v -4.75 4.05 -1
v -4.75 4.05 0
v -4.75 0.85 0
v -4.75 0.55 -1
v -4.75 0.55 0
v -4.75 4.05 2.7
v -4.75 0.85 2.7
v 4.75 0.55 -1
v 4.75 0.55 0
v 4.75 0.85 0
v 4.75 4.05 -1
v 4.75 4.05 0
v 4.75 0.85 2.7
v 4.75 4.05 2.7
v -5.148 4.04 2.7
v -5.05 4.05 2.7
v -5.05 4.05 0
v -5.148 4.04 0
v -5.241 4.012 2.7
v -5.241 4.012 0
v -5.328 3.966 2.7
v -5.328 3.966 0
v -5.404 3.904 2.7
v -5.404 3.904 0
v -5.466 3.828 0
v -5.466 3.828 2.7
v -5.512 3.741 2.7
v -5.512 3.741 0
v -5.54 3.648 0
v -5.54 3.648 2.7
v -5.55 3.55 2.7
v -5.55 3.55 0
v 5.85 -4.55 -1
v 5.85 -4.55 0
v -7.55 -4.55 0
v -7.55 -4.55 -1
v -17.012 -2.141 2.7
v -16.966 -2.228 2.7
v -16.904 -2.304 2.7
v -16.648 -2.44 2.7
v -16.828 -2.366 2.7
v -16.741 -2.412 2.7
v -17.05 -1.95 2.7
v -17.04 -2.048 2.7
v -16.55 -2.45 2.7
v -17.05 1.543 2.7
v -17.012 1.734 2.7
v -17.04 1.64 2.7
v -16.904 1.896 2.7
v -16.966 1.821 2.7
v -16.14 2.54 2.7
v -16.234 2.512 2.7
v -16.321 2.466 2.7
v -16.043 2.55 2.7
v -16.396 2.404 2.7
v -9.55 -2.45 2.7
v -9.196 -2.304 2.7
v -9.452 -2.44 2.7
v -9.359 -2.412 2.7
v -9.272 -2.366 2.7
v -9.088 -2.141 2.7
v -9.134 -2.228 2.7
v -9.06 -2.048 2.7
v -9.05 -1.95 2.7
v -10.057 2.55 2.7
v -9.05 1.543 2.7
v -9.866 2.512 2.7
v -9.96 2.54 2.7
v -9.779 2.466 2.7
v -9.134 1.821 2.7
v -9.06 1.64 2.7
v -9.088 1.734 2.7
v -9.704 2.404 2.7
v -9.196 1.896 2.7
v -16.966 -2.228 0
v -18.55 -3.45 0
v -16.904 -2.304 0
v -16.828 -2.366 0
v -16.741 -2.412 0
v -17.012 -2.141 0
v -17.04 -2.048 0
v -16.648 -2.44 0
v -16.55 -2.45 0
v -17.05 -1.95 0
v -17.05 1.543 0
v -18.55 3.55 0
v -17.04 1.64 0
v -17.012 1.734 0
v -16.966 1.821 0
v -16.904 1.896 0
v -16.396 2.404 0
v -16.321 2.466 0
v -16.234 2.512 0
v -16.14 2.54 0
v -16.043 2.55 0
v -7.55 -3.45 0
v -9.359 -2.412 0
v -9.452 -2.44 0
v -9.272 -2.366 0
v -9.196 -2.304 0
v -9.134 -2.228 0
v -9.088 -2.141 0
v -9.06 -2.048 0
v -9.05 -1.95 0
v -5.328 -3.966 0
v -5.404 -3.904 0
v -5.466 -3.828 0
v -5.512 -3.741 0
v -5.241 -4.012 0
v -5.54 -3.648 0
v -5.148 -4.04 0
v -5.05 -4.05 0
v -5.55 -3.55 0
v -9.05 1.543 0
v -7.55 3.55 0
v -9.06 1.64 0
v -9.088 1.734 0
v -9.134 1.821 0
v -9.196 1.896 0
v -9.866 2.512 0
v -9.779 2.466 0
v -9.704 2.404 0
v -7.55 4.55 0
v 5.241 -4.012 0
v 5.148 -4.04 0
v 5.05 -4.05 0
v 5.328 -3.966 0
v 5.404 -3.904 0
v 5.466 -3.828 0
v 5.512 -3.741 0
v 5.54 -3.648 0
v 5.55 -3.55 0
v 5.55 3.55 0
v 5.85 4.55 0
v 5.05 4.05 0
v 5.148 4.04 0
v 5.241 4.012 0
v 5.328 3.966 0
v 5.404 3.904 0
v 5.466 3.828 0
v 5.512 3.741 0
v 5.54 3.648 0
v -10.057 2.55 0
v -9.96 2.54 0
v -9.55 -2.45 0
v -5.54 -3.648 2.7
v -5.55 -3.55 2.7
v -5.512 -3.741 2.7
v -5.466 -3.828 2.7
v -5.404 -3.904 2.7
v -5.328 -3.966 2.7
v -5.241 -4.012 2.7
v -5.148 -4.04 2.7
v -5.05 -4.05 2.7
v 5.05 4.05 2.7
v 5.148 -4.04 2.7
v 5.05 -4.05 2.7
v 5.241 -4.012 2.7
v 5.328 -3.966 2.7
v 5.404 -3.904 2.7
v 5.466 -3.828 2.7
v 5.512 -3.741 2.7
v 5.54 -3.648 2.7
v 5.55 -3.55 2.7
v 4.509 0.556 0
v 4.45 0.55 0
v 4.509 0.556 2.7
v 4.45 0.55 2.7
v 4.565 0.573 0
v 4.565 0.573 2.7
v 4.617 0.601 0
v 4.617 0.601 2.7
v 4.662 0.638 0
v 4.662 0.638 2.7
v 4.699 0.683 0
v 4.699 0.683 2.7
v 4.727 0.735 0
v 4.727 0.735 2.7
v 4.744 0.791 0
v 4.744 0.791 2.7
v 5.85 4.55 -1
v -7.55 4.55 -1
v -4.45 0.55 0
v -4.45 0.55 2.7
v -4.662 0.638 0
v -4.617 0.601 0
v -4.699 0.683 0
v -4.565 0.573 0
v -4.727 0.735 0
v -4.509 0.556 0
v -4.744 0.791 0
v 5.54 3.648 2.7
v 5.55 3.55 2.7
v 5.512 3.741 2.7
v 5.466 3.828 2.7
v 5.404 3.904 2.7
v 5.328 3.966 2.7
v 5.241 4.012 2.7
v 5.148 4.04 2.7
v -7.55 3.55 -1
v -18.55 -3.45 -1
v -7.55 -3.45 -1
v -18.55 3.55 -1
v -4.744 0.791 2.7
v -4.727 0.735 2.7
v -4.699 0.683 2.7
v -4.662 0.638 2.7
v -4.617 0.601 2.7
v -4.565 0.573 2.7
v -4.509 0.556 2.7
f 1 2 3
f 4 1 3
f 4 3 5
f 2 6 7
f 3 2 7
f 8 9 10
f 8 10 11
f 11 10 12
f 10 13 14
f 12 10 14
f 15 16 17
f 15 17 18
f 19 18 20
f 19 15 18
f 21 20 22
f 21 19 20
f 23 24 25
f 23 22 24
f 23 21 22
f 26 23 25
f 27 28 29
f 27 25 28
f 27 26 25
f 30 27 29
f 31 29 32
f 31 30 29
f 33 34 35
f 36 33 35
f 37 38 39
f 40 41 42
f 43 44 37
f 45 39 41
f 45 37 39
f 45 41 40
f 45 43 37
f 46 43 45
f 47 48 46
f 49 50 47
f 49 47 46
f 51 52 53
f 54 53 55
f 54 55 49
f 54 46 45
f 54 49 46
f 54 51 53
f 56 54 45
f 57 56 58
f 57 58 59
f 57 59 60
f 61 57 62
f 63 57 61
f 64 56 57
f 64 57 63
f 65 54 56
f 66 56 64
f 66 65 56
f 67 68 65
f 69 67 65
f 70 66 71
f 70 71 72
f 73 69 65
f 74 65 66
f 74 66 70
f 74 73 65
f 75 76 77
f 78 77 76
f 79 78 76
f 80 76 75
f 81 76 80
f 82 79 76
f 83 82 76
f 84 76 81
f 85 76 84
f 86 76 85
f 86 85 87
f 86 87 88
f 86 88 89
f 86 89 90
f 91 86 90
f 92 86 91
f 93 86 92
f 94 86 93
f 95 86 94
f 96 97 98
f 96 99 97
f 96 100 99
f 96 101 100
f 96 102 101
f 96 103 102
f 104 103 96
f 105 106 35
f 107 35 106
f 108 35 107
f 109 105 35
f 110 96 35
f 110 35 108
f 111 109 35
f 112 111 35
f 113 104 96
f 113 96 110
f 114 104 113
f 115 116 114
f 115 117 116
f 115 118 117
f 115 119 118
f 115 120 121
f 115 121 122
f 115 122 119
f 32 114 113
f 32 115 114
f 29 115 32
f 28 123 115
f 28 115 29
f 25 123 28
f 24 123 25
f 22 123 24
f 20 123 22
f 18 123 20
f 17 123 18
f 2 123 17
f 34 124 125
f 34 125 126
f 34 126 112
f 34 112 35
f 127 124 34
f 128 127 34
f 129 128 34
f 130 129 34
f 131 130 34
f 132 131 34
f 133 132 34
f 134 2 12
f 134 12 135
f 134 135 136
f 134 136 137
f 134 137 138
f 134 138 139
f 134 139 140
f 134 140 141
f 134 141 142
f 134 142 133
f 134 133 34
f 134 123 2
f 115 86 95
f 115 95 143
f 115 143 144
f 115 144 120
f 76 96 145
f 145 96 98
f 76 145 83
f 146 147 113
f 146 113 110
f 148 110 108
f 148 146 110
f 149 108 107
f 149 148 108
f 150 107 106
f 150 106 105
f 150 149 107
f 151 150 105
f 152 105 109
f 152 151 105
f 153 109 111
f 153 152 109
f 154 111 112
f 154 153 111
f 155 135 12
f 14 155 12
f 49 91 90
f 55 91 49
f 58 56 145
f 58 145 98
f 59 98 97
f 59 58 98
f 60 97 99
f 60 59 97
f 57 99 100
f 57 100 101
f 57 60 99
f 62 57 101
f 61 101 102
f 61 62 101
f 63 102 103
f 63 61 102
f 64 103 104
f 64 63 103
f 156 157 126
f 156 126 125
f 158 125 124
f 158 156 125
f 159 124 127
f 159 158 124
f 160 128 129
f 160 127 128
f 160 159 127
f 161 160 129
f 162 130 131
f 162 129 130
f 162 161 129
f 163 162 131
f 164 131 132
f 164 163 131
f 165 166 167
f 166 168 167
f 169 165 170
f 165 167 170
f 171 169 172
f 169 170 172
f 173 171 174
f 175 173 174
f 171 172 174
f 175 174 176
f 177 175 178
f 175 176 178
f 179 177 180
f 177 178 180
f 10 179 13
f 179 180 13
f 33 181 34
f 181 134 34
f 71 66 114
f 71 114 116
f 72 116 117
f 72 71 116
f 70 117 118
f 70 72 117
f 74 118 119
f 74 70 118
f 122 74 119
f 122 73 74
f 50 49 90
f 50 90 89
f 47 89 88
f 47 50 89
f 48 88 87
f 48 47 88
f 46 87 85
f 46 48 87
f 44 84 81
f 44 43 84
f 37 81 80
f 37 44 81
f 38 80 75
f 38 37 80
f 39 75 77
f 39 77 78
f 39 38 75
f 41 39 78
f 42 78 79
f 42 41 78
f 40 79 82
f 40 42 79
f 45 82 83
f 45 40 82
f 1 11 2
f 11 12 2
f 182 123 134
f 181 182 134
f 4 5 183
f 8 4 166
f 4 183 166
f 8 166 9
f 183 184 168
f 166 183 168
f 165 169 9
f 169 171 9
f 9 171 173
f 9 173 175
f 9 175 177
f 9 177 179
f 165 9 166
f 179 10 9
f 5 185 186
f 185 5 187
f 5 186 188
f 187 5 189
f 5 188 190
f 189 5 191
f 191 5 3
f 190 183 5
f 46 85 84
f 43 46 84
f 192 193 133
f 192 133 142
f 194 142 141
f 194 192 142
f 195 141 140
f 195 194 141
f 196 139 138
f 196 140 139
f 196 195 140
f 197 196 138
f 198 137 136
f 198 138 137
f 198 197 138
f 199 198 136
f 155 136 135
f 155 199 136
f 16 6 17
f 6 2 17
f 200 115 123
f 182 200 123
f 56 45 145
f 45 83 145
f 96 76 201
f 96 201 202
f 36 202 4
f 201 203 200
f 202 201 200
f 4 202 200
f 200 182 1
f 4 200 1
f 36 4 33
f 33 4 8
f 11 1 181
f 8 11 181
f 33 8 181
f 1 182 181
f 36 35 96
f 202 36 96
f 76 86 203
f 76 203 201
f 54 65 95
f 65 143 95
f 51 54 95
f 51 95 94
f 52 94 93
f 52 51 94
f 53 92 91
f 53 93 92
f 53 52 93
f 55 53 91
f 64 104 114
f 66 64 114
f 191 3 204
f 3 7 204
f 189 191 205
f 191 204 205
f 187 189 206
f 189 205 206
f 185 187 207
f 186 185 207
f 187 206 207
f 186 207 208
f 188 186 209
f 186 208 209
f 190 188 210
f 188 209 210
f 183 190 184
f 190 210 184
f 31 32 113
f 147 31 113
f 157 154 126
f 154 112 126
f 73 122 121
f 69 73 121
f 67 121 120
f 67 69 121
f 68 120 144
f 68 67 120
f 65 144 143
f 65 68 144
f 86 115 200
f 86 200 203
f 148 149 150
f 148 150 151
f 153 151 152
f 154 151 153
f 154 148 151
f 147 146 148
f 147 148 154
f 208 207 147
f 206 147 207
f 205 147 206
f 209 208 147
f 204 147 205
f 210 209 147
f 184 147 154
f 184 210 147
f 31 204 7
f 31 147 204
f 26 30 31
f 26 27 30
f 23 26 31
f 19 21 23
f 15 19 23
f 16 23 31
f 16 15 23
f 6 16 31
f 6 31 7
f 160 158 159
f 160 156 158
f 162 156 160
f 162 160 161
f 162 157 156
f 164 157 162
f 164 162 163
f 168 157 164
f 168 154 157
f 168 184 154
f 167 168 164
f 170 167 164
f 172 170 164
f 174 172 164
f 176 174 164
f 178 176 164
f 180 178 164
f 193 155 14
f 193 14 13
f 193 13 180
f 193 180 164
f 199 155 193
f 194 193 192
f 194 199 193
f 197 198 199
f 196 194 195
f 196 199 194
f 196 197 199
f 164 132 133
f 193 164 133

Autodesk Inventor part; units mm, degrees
ref_plane "YZ Plane" through (0, 0, 0) normal (1, 0, 0) x (0, 1, 0)
ref_plane "XZ Plane" through (0, 0, 0) normal (0, 1, 0) x (-1, 0, 0)
ref_plane "XY Plane" through (0, 0, 0) normal (0, 0, 1) x (1, 0, 0)
sketch "Sketch1" plane through (0, 0, 0) normal (0, 0, 1) x (1, 0, 0)
  line L0 (-5.55, -4.05) -> (5.55, -4.05)
  line L1 (5.55, -4.05) -> (5.55, 4.05)
  line L2 (5.55, 4.05) -> (-5.55, 4.05)
  line L3 (-5.55, 4.05) -> (-5.55, -4.05)
  line L4 (-5.55, -4.05) -> (5.55, 4.05) construction
  line L5 (5.55, -4.05) -> (-5.55, 4.05) construction
  line L6 (-4.75, 0.55) -> (4.75, 0.55)
  line L7 (4.75, 0.55) -> (4.75, 7.55)
  line L8 (4.75, 7.55) -> (-4.75, 7.55)
  line L9 (-4.75, 7.55) -> (-4.75, 0.55)
  line L10 (-4.75, 0.55) -> (4.75, 7.55) construction
  line L11 (4.75, 0.55) -> (-4.75, 7.55) construction
  line L12 (5.85, -4.55) -> (-7.55, -4.55)
  line L13 (-7.55, -4.55) -> (-7.55, 4.55)
  line L14 (-7.55, 4.55) -> (5.85, 4.55)
  line L15 (5.85, 4.55) -> (5.85, -4.55)
  line L16 (-17.05, -2.45) -> (-9.05, -2.45)
  line L17 (-9.05, -2.45) -> (-9.05, 2.55)
  line L18 (-9.05, 2.55) -> (-17.05, 2.55)
  line L19 (-17.05, 2.55) -> (-17.05, -2.45)
  line L20 (-17.05, -2.45) -> (-9.05, 2.55) construction
  line L21 (-9.05, -2.45) -> (-17.05, 2.55) construction
  line L22 (-18.55, -3.45) -> (-7.55, -3.45)
  line L23 (-7.55, -3.45) -> (-7.55, 3.55)
  line L24 (-7.55, 3.55) -> (-18.55, 3.55)
  line L25 (-18.55, 3.55) -> (-18.55, -3.45)
  line L26 (-18.55, -3.45) -> (-7.55, 3.55) construction
  line L27 (-7.55, -3.45) -> (-18.55, 3.55) construction
  point P0 (0, 0)
  point P1 (0, 4.05)
  point P2 (4.75, 4.05)
  point P3 (-4.75, 4.05)
  point P4 (-13.05, 0.05)
  point P5 (-7.55, -3.45)
  dimension "d0" = 11.1
  dimension "d1" = 8.1
  dimension "d2" = 9.5
  dimension "d3" = 4.6
  dimension "d8" = 0.5
  dimension "d9" = 2
  dimension "d10" = 0.5
  dimension "d11" = 0.3
  dimension "d14" = 8
  dimension "d15" = 5
  dimension "d16" = 1.5
  dimension "d17" = 22.6
  dimension "d18" = 7
extrude "Extrusion1" add sketch "Sketch1" along normal blind 2.7 contours L3 L2 L9 L6 L7 L1 L0
fillet "Fillet1" radius 0.5 4 edges at (5.55, 4.05, 1.35) (5.55, -4.05, 1.35) (-5.55, -4.05, 1.35) (-5.55, 4.05, 1.35)
fillet "Fillet2" radius 0.3 2 edges at (-4.75, 0.55, 1.35) (4.75, 0.55, 1.35)
extrude "Extrusion2" add sketch "Sketch1" against normal blind 1 contours L3 L2 L9 L6 L7 L1 L0 | L0 L1 L2 L7 L14 L15 L12 L13 L9 L3 | L9 L14 L7 L2
extrude "Extrusion3" add sketch "Sketch1" against normal up to surface (1 mm away) contours L13 L22 L25 L24 | L19 L18 L17 L16
extrude "Extrusion4" add sketch "Sketch1" along normal up to surface (2.7 mm away) contours L19 L18 L17 L16
chamfer "Chamfer1" distance 0.8 angle 45 2 edges at (-9.05, 2.55, 1.35) (-17.05, 2.55, 1.35)
fillet "Fillet3" radius 0.5 6 edges at (-9.85, 2.55, 1.35) (-9.05, 1.75, 1.35) (-9.05, -2.45, 1.35) (-16.25, 2.55, 1.35) (-17.05, 1.75, 1.35) (-17.05, -2.45, 1.35)
properties part number "firewire-02"
